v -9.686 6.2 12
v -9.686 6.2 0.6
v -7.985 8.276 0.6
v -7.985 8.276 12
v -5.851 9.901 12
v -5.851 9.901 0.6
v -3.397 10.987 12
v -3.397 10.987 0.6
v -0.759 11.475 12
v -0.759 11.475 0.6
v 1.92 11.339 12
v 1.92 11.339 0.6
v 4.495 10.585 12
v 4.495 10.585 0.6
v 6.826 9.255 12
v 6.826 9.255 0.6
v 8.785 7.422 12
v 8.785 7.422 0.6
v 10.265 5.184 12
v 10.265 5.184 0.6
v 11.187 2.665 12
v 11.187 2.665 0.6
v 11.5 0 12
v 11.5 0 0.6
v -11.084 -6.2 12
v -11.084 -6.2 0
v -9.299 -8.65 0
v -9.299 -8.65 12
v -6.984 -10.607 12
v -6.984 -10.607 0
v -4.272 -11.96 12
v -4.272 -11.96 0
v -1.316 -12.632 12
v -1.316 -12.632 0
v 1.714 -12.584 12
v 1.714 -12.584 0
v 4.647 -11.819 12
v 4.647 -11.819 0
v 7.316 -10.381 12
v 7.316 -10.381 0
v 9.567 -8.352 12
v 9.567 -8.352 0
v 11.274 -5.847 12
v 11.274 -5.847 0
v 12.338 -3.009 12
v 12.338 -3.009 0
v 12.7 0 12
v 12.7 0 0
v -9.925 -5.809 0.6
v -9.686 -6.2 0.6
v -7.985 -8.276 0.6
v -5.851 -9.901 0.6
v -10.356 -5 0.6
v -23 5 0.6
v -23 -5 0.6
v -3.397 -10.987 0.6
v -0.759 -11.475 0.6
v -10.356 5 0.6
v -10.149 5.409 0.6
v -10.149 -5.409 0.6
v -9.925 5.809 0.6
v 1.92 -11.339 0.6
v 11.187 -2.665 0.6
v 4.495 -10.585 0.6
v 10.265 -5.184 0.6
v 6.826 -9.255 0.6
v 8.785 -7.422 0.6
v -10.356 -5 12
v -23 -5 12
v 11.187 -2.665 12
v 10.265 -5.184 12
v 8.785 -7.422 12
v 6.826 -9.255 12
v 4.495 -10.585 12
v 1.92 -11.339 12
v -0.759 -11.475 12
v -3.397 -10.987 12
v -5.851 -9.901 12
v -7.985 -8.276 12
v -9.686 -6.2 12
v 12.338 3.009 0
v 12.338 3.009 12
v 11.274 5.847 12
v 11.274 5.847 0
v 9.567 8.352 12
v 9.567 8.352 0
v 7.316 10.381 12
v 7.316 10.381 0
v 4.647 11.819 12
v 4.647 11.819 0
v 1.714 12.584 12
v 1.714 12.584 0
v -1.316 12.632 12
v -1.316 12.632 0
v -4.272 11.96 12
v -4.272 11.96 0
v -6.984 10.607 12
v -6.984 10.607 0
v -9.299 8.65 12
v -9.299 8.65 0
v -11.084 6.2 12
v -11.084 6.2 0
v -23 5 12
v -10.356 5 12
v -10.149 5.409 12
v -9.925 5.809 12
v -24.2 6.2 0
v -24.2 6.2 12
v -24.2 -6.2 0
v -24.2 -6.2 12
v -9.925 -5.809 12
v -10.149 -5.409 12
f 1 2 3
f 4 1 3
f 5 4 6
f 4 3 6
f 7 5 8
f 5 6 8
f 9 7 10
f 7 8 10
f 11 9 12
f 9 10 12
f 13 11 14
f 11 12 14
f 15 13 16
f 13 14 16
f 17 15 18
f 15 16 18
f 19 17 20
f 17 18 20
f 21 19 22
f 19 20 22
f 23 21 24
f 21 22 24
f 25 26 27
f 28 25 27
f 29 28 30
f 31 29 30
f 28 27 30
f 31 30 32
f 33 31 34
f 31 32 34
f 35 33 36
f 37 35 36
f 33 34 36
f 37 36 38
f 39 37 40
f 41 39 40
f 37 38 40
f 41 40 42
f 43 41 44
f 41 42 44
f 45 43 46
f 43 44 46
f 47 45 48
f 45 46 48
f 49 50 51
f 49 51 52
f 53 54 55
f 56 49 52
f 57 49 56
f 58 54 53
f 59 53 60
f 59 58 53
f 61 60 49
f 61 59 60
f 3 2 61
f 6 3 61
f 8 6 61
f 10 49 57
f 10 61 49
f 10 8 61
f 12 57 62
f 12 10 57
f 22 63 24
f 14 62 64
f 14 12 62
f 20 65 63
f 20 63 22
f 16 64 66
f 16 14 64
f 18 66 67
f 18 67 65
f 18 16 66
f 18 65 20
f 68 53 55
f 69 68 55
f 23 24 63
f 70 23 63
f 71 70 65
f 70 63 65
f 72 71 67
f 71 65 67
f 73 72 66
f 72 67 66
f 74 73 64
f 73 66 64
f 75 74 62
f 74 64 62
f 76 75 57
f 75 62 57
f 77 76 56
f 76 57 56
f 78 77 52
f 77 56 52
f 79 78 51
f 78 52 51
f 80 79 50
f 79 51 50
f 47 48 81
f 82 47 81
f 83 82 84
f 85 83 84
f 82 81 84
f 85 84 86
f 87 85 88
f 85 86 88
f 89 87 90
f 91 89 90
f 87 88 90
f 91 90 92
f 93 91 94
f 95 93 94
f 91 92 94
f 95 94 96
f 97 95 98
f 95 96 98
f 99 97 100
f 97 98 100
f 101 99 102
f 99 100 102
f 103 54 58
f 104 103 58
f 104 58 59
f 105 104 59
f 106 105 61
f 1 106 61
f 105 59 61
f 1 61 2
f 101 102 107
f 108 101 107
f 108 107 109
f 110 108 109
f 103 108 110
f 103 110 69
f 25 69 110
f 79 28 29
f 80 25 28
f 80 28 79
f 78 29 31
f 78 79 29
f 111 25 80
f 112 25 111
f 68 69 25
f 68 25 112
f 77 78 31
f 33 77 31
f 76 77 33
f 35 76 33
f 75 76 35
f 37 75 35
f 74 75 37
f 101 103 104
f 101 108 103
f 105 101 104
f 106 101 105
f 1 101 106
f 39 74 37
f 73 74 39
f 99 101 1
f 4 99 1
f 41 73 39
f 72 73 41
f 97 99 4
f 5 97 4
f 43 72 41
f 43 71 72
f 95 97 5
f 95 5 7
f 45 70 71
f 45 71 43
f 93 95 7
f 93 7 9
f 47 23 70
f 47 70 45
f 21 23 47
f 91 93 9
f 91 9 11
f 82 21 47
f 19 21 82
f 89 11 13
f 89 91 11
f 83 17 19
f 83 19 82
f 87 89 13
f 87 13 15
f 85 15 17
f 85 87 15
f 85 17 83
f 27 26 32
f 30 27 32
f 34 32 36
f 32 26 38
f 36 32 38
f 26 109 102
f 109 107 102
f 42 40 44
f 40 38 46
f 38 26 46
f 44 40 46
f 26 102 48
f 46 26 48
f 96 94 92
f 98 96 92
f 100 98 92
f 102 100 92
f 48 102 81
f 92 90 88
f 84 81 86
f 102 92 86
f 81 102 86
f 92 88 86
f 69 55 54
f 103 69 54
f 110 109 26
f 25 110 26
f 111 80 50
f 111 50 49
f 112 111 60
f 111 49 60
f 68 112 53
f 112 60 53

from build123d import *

# Parameters (mm, degrees)
F1_DEPTH = 12
F2_DEPTH = 0.6


with BuildPart() as f1:
    # F0 (on Top) → F1 (new body)
    with BuildSketch(Plane.XY):
        with BuildLine():
            ThreePointArc((-11.6743308159, 5), (-11.3948589306, 5.6077794136), (-11.0837719211, 6.2))
            Line((-11.0837719211, 6.2), (-24.2, 6.2))
            Line((-24.2, 6.2), (-24.2, 0))
            Line((-24.2, 0), (-24.2, -6.2))
            Line((-24.2, -6.2), (-11.0837719211, -6.2))
            ThreePointArc((-11.0837719211, -6.2), (-11.3948589306, -5.6077794136), (-11.6743308159, -5))
            Line((-11.6743308159, -5), (-23, -5))
            Line((-23, -5), (-23, 0))
            Line((-23, 0), (-23, 5))
            Line((-23, 5), (-11.6743308159, 5))
        make_face()
        with BuildLine():
            ThreePointArc((-9.6855562566, 6.2), (3.2300234557, 11.0370715534), (11.5, 0))
            ThreePointArc((11.5, 0), (3.2300234557, -11.0370715534), (-9.6855562566, -6.2))
            Line((-9.6855562566, -6.2), (-11.0837719211, -6.2))
            ThreePointArc((-11.0837719211, -6.2), (3.2035992728, -12.2893023276), (12.7, 0))
            ThreePointArc((12.7, 0), (3.2035992728, 12.2893023276), (-11.0837719211, 6.2))
            Line((-11.0837719211, 6.2), (-9.6855562566, 6.2))
        make_face()
        with BuildLine():
            ThreePointArc((-10.3561575886, 5), (-10.038803388, 5.610029103), (-9.6855562566, 6.2))
            Line((-9.6855562566, 6.2), (-11.0837719211, 6.2))
            ThreePointArc((-11.0837719211, 6.2), (-11.3948589306, 5.6077794136), (-11.6743308159, 5))
            Line((-11.6743308159, 5), (-10.3561575886, 5))
        make_face()
        with BuildLine():
            Line((-11.0837719211, -6.2), (-9.6855562566, -6.2))
            ThreePointArc((-9.6855562566, -6.2), (-10.038803388, -5.610029103), (-10.3561575886, -5))
            Line((-10.3561575886, -5), (-11.6743308159, -5))
            ThreePointArc((-11.6743308159, -5), (-11.3948589306, -5.6077794136), (-11.0837719211, -6.2))
        make_face()
    extrude(amount=F1_DEPTH)

    # F0 (on Top) → F2 (join)
    with BuildSketch(Plane.XY):
        with BuildLine():
            ThreePointArc((-9.6855562566, -6.2), (3.2300234557, -11.0370715534), (11.5, 0))
            ThreePointArc((11.5, 0), (3.2300234557, 11.0370715534), (-9.6855562566, 6.2))
            ThreePointArc((-9.6855562566, 6.2), (-10.038803388, 5.610029103), (-10.3561575886, 5))
            Line((-10.3561575886, 5), (0, 5))
            Line((0, 5), (0, 0))
            Line((0, 0), (-11.5, 0))
            ThreePointArc((-11.5, 0), (-11.2103927734, -2.5645845405), (-10.3561575886, -5))
            ThreePointArc((-10.3561575886, -5), (-10.038803388, -5.610029103), (-9.6855562566, -6.2))
        make_face()
        with BuildLine():
            ThreePointArc((-12.7, 0), (-12.4409405063, 2.5520578596), (-11.6743308159, 5))
            Line((-11.6743308159, 5), (-23, 5))
            Line((-23, 5), (-23, 0))
            Line((-23, 0), (-12.7, 0))
        make_face()
        with BuildLine():
            Line((0, 5), (-10.3561575886, 5))
            ThreePointArc((-10.3561575886, 5), (-11.2103927734, 2.5645845405), (-11.5, 0))
            Line((-11.5, 0), (0, 0))
            Line((0, 0), (0, 5))
        make_face()
        with BuildLine():
            ThreePointArc((-11.5, 0), (-11.2103927734, 2.5645845405), (-10.3561575886, 5))
            Line((-10.3561575886, 5), (-11.6743308159, 5))
            ThreePointArc((-11.6743308159, 5), (-12.4409405063, 2.5520578596), (-12.7, 0))
            Line((-12.7, 0), (-11.5, 0))
        make_face()
        with BuildLine():
            Line((-23, -5), (-11.6743308159, -5))
            ThreePointArc((-11.6743308159, -5), (-12.4409405063, -2.5520578596), (-12.7, 0))
            Line((-12.7, 0), (-23, 0))
            Line((-23, 0), (-23, -5))
        make_face()
        with BuildLine():
            Line((-11.6743308159, -5), (-10.3561575886, -5))
            ThreePointArc((-10.3561575886, -5), (-11.2103927734, -2.5645845405), (-11.5, 0))
            Line((-11.5, 0), (-12.7, 0))
            ThreePointArc((-12.7, 0), (-12.4409405063, -2.5520578596), (-11.6743308159, -5))
        make_face()
    extrude(amount=F2_DEPTH)


solid = f1.part
